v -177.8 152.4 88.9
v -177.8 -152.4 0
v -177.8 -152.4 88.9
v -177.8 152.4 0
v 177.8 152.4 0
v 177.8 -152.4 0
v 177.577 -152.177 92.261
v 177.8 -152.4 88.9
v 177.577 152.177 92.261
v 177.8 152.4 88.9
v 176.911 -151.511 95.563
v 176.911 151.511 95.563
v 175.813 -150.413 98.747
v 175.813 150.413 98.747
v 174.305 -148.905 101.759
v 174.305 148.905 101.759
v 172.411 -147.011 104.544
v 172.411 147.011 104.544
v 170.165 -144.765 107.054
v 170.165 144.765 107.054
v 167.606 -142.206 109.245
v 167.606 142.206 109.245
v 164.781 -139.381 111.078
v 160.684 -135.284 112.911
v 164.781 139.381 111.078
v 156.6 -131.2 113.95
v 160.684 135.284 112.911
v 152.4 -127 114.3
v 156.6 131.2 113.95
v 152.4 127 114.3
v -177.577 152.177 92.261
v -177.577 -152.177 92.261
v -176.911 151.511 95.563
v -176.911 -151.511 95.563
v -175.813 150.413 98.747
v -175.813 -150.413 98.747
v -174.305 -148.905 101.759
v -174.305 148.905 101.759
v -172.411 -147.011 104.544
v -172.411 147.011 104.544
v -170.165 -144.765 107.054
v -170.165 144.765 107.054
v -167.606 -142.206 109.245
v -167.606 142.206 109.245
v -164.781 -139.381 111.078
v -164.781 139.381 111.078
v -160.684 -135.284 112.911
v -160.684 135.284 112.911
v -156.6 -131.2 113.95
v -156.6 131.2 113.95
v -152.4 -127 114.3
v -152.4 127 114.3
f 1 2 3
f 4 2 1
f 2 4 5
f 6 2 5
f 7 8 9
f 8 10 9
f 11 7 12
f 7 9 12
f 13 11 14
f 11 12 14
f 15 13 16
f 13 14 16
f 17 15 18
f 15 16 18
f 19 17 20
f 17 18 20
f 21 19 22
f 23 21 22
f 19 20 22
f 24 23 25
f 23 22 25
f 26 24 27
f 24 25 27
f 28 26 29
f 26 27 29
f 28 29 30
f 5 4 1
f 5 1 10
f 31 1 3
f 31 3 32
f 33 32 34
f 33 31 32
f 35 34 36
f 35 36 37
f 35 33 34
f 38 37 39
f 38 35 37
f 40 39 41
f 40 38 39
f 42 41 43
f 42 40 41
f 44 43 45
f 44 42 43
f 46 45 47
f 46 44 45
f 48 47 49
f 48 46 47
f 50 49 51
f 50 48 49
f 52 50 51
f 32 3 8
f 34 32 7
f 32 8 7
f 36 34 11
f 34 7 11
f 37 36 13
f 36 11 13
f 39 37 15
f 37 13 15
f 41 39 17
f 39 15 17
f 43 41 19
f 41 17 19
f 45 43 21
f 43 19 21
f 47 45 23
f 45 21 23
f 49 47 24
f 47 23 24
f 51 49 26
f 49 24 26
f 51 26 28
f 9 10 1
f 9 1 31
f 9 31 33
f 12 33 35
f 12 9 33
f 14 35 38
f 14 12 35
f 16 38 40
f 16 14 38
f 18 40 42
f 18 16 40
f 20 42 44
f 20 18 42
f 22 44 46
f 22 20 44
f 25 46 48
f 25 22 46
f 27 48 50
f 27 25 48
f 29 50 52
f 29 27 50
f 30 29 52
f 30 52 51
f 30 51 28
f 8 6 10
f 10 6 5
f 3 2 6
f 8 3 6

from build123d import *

# Parameters (mm, degrees)
F0_W     = 355.6
F0_H     = 304.8
F1_DEPTH = 25.4
F2_W     = 355.6
F2_H     = 304.8
F3_DEPTH = 88.9
F4_R     = 25.4


with BuildPart() as f1:
    # F0 (on Top) → F1 (new body)
    with BuildSketch(Plane.XY):
        Rectangle(F0_W, F0_H)
    extrude(amount=F1_DEPTH)

    # F2 (on face) → F3 (join)
    with BuildSketch(Plane.XY.offset(25.4)):
        Rectangle(F2_W, F2_H)
    extrude(amount=F3_DEPTH)

    # F4
    f4_edges = [f1.edges().sort_by_distance(p)[0] for p in [
        (-177.8, 0, 114.3),
        (0, -152.4, 114.3),
        (177.8, 0, 114.3),
        (0, 152.4, 114.3),
    ]]
    fillet(f4_edges, radius=F4_R)


solid = f1.part
